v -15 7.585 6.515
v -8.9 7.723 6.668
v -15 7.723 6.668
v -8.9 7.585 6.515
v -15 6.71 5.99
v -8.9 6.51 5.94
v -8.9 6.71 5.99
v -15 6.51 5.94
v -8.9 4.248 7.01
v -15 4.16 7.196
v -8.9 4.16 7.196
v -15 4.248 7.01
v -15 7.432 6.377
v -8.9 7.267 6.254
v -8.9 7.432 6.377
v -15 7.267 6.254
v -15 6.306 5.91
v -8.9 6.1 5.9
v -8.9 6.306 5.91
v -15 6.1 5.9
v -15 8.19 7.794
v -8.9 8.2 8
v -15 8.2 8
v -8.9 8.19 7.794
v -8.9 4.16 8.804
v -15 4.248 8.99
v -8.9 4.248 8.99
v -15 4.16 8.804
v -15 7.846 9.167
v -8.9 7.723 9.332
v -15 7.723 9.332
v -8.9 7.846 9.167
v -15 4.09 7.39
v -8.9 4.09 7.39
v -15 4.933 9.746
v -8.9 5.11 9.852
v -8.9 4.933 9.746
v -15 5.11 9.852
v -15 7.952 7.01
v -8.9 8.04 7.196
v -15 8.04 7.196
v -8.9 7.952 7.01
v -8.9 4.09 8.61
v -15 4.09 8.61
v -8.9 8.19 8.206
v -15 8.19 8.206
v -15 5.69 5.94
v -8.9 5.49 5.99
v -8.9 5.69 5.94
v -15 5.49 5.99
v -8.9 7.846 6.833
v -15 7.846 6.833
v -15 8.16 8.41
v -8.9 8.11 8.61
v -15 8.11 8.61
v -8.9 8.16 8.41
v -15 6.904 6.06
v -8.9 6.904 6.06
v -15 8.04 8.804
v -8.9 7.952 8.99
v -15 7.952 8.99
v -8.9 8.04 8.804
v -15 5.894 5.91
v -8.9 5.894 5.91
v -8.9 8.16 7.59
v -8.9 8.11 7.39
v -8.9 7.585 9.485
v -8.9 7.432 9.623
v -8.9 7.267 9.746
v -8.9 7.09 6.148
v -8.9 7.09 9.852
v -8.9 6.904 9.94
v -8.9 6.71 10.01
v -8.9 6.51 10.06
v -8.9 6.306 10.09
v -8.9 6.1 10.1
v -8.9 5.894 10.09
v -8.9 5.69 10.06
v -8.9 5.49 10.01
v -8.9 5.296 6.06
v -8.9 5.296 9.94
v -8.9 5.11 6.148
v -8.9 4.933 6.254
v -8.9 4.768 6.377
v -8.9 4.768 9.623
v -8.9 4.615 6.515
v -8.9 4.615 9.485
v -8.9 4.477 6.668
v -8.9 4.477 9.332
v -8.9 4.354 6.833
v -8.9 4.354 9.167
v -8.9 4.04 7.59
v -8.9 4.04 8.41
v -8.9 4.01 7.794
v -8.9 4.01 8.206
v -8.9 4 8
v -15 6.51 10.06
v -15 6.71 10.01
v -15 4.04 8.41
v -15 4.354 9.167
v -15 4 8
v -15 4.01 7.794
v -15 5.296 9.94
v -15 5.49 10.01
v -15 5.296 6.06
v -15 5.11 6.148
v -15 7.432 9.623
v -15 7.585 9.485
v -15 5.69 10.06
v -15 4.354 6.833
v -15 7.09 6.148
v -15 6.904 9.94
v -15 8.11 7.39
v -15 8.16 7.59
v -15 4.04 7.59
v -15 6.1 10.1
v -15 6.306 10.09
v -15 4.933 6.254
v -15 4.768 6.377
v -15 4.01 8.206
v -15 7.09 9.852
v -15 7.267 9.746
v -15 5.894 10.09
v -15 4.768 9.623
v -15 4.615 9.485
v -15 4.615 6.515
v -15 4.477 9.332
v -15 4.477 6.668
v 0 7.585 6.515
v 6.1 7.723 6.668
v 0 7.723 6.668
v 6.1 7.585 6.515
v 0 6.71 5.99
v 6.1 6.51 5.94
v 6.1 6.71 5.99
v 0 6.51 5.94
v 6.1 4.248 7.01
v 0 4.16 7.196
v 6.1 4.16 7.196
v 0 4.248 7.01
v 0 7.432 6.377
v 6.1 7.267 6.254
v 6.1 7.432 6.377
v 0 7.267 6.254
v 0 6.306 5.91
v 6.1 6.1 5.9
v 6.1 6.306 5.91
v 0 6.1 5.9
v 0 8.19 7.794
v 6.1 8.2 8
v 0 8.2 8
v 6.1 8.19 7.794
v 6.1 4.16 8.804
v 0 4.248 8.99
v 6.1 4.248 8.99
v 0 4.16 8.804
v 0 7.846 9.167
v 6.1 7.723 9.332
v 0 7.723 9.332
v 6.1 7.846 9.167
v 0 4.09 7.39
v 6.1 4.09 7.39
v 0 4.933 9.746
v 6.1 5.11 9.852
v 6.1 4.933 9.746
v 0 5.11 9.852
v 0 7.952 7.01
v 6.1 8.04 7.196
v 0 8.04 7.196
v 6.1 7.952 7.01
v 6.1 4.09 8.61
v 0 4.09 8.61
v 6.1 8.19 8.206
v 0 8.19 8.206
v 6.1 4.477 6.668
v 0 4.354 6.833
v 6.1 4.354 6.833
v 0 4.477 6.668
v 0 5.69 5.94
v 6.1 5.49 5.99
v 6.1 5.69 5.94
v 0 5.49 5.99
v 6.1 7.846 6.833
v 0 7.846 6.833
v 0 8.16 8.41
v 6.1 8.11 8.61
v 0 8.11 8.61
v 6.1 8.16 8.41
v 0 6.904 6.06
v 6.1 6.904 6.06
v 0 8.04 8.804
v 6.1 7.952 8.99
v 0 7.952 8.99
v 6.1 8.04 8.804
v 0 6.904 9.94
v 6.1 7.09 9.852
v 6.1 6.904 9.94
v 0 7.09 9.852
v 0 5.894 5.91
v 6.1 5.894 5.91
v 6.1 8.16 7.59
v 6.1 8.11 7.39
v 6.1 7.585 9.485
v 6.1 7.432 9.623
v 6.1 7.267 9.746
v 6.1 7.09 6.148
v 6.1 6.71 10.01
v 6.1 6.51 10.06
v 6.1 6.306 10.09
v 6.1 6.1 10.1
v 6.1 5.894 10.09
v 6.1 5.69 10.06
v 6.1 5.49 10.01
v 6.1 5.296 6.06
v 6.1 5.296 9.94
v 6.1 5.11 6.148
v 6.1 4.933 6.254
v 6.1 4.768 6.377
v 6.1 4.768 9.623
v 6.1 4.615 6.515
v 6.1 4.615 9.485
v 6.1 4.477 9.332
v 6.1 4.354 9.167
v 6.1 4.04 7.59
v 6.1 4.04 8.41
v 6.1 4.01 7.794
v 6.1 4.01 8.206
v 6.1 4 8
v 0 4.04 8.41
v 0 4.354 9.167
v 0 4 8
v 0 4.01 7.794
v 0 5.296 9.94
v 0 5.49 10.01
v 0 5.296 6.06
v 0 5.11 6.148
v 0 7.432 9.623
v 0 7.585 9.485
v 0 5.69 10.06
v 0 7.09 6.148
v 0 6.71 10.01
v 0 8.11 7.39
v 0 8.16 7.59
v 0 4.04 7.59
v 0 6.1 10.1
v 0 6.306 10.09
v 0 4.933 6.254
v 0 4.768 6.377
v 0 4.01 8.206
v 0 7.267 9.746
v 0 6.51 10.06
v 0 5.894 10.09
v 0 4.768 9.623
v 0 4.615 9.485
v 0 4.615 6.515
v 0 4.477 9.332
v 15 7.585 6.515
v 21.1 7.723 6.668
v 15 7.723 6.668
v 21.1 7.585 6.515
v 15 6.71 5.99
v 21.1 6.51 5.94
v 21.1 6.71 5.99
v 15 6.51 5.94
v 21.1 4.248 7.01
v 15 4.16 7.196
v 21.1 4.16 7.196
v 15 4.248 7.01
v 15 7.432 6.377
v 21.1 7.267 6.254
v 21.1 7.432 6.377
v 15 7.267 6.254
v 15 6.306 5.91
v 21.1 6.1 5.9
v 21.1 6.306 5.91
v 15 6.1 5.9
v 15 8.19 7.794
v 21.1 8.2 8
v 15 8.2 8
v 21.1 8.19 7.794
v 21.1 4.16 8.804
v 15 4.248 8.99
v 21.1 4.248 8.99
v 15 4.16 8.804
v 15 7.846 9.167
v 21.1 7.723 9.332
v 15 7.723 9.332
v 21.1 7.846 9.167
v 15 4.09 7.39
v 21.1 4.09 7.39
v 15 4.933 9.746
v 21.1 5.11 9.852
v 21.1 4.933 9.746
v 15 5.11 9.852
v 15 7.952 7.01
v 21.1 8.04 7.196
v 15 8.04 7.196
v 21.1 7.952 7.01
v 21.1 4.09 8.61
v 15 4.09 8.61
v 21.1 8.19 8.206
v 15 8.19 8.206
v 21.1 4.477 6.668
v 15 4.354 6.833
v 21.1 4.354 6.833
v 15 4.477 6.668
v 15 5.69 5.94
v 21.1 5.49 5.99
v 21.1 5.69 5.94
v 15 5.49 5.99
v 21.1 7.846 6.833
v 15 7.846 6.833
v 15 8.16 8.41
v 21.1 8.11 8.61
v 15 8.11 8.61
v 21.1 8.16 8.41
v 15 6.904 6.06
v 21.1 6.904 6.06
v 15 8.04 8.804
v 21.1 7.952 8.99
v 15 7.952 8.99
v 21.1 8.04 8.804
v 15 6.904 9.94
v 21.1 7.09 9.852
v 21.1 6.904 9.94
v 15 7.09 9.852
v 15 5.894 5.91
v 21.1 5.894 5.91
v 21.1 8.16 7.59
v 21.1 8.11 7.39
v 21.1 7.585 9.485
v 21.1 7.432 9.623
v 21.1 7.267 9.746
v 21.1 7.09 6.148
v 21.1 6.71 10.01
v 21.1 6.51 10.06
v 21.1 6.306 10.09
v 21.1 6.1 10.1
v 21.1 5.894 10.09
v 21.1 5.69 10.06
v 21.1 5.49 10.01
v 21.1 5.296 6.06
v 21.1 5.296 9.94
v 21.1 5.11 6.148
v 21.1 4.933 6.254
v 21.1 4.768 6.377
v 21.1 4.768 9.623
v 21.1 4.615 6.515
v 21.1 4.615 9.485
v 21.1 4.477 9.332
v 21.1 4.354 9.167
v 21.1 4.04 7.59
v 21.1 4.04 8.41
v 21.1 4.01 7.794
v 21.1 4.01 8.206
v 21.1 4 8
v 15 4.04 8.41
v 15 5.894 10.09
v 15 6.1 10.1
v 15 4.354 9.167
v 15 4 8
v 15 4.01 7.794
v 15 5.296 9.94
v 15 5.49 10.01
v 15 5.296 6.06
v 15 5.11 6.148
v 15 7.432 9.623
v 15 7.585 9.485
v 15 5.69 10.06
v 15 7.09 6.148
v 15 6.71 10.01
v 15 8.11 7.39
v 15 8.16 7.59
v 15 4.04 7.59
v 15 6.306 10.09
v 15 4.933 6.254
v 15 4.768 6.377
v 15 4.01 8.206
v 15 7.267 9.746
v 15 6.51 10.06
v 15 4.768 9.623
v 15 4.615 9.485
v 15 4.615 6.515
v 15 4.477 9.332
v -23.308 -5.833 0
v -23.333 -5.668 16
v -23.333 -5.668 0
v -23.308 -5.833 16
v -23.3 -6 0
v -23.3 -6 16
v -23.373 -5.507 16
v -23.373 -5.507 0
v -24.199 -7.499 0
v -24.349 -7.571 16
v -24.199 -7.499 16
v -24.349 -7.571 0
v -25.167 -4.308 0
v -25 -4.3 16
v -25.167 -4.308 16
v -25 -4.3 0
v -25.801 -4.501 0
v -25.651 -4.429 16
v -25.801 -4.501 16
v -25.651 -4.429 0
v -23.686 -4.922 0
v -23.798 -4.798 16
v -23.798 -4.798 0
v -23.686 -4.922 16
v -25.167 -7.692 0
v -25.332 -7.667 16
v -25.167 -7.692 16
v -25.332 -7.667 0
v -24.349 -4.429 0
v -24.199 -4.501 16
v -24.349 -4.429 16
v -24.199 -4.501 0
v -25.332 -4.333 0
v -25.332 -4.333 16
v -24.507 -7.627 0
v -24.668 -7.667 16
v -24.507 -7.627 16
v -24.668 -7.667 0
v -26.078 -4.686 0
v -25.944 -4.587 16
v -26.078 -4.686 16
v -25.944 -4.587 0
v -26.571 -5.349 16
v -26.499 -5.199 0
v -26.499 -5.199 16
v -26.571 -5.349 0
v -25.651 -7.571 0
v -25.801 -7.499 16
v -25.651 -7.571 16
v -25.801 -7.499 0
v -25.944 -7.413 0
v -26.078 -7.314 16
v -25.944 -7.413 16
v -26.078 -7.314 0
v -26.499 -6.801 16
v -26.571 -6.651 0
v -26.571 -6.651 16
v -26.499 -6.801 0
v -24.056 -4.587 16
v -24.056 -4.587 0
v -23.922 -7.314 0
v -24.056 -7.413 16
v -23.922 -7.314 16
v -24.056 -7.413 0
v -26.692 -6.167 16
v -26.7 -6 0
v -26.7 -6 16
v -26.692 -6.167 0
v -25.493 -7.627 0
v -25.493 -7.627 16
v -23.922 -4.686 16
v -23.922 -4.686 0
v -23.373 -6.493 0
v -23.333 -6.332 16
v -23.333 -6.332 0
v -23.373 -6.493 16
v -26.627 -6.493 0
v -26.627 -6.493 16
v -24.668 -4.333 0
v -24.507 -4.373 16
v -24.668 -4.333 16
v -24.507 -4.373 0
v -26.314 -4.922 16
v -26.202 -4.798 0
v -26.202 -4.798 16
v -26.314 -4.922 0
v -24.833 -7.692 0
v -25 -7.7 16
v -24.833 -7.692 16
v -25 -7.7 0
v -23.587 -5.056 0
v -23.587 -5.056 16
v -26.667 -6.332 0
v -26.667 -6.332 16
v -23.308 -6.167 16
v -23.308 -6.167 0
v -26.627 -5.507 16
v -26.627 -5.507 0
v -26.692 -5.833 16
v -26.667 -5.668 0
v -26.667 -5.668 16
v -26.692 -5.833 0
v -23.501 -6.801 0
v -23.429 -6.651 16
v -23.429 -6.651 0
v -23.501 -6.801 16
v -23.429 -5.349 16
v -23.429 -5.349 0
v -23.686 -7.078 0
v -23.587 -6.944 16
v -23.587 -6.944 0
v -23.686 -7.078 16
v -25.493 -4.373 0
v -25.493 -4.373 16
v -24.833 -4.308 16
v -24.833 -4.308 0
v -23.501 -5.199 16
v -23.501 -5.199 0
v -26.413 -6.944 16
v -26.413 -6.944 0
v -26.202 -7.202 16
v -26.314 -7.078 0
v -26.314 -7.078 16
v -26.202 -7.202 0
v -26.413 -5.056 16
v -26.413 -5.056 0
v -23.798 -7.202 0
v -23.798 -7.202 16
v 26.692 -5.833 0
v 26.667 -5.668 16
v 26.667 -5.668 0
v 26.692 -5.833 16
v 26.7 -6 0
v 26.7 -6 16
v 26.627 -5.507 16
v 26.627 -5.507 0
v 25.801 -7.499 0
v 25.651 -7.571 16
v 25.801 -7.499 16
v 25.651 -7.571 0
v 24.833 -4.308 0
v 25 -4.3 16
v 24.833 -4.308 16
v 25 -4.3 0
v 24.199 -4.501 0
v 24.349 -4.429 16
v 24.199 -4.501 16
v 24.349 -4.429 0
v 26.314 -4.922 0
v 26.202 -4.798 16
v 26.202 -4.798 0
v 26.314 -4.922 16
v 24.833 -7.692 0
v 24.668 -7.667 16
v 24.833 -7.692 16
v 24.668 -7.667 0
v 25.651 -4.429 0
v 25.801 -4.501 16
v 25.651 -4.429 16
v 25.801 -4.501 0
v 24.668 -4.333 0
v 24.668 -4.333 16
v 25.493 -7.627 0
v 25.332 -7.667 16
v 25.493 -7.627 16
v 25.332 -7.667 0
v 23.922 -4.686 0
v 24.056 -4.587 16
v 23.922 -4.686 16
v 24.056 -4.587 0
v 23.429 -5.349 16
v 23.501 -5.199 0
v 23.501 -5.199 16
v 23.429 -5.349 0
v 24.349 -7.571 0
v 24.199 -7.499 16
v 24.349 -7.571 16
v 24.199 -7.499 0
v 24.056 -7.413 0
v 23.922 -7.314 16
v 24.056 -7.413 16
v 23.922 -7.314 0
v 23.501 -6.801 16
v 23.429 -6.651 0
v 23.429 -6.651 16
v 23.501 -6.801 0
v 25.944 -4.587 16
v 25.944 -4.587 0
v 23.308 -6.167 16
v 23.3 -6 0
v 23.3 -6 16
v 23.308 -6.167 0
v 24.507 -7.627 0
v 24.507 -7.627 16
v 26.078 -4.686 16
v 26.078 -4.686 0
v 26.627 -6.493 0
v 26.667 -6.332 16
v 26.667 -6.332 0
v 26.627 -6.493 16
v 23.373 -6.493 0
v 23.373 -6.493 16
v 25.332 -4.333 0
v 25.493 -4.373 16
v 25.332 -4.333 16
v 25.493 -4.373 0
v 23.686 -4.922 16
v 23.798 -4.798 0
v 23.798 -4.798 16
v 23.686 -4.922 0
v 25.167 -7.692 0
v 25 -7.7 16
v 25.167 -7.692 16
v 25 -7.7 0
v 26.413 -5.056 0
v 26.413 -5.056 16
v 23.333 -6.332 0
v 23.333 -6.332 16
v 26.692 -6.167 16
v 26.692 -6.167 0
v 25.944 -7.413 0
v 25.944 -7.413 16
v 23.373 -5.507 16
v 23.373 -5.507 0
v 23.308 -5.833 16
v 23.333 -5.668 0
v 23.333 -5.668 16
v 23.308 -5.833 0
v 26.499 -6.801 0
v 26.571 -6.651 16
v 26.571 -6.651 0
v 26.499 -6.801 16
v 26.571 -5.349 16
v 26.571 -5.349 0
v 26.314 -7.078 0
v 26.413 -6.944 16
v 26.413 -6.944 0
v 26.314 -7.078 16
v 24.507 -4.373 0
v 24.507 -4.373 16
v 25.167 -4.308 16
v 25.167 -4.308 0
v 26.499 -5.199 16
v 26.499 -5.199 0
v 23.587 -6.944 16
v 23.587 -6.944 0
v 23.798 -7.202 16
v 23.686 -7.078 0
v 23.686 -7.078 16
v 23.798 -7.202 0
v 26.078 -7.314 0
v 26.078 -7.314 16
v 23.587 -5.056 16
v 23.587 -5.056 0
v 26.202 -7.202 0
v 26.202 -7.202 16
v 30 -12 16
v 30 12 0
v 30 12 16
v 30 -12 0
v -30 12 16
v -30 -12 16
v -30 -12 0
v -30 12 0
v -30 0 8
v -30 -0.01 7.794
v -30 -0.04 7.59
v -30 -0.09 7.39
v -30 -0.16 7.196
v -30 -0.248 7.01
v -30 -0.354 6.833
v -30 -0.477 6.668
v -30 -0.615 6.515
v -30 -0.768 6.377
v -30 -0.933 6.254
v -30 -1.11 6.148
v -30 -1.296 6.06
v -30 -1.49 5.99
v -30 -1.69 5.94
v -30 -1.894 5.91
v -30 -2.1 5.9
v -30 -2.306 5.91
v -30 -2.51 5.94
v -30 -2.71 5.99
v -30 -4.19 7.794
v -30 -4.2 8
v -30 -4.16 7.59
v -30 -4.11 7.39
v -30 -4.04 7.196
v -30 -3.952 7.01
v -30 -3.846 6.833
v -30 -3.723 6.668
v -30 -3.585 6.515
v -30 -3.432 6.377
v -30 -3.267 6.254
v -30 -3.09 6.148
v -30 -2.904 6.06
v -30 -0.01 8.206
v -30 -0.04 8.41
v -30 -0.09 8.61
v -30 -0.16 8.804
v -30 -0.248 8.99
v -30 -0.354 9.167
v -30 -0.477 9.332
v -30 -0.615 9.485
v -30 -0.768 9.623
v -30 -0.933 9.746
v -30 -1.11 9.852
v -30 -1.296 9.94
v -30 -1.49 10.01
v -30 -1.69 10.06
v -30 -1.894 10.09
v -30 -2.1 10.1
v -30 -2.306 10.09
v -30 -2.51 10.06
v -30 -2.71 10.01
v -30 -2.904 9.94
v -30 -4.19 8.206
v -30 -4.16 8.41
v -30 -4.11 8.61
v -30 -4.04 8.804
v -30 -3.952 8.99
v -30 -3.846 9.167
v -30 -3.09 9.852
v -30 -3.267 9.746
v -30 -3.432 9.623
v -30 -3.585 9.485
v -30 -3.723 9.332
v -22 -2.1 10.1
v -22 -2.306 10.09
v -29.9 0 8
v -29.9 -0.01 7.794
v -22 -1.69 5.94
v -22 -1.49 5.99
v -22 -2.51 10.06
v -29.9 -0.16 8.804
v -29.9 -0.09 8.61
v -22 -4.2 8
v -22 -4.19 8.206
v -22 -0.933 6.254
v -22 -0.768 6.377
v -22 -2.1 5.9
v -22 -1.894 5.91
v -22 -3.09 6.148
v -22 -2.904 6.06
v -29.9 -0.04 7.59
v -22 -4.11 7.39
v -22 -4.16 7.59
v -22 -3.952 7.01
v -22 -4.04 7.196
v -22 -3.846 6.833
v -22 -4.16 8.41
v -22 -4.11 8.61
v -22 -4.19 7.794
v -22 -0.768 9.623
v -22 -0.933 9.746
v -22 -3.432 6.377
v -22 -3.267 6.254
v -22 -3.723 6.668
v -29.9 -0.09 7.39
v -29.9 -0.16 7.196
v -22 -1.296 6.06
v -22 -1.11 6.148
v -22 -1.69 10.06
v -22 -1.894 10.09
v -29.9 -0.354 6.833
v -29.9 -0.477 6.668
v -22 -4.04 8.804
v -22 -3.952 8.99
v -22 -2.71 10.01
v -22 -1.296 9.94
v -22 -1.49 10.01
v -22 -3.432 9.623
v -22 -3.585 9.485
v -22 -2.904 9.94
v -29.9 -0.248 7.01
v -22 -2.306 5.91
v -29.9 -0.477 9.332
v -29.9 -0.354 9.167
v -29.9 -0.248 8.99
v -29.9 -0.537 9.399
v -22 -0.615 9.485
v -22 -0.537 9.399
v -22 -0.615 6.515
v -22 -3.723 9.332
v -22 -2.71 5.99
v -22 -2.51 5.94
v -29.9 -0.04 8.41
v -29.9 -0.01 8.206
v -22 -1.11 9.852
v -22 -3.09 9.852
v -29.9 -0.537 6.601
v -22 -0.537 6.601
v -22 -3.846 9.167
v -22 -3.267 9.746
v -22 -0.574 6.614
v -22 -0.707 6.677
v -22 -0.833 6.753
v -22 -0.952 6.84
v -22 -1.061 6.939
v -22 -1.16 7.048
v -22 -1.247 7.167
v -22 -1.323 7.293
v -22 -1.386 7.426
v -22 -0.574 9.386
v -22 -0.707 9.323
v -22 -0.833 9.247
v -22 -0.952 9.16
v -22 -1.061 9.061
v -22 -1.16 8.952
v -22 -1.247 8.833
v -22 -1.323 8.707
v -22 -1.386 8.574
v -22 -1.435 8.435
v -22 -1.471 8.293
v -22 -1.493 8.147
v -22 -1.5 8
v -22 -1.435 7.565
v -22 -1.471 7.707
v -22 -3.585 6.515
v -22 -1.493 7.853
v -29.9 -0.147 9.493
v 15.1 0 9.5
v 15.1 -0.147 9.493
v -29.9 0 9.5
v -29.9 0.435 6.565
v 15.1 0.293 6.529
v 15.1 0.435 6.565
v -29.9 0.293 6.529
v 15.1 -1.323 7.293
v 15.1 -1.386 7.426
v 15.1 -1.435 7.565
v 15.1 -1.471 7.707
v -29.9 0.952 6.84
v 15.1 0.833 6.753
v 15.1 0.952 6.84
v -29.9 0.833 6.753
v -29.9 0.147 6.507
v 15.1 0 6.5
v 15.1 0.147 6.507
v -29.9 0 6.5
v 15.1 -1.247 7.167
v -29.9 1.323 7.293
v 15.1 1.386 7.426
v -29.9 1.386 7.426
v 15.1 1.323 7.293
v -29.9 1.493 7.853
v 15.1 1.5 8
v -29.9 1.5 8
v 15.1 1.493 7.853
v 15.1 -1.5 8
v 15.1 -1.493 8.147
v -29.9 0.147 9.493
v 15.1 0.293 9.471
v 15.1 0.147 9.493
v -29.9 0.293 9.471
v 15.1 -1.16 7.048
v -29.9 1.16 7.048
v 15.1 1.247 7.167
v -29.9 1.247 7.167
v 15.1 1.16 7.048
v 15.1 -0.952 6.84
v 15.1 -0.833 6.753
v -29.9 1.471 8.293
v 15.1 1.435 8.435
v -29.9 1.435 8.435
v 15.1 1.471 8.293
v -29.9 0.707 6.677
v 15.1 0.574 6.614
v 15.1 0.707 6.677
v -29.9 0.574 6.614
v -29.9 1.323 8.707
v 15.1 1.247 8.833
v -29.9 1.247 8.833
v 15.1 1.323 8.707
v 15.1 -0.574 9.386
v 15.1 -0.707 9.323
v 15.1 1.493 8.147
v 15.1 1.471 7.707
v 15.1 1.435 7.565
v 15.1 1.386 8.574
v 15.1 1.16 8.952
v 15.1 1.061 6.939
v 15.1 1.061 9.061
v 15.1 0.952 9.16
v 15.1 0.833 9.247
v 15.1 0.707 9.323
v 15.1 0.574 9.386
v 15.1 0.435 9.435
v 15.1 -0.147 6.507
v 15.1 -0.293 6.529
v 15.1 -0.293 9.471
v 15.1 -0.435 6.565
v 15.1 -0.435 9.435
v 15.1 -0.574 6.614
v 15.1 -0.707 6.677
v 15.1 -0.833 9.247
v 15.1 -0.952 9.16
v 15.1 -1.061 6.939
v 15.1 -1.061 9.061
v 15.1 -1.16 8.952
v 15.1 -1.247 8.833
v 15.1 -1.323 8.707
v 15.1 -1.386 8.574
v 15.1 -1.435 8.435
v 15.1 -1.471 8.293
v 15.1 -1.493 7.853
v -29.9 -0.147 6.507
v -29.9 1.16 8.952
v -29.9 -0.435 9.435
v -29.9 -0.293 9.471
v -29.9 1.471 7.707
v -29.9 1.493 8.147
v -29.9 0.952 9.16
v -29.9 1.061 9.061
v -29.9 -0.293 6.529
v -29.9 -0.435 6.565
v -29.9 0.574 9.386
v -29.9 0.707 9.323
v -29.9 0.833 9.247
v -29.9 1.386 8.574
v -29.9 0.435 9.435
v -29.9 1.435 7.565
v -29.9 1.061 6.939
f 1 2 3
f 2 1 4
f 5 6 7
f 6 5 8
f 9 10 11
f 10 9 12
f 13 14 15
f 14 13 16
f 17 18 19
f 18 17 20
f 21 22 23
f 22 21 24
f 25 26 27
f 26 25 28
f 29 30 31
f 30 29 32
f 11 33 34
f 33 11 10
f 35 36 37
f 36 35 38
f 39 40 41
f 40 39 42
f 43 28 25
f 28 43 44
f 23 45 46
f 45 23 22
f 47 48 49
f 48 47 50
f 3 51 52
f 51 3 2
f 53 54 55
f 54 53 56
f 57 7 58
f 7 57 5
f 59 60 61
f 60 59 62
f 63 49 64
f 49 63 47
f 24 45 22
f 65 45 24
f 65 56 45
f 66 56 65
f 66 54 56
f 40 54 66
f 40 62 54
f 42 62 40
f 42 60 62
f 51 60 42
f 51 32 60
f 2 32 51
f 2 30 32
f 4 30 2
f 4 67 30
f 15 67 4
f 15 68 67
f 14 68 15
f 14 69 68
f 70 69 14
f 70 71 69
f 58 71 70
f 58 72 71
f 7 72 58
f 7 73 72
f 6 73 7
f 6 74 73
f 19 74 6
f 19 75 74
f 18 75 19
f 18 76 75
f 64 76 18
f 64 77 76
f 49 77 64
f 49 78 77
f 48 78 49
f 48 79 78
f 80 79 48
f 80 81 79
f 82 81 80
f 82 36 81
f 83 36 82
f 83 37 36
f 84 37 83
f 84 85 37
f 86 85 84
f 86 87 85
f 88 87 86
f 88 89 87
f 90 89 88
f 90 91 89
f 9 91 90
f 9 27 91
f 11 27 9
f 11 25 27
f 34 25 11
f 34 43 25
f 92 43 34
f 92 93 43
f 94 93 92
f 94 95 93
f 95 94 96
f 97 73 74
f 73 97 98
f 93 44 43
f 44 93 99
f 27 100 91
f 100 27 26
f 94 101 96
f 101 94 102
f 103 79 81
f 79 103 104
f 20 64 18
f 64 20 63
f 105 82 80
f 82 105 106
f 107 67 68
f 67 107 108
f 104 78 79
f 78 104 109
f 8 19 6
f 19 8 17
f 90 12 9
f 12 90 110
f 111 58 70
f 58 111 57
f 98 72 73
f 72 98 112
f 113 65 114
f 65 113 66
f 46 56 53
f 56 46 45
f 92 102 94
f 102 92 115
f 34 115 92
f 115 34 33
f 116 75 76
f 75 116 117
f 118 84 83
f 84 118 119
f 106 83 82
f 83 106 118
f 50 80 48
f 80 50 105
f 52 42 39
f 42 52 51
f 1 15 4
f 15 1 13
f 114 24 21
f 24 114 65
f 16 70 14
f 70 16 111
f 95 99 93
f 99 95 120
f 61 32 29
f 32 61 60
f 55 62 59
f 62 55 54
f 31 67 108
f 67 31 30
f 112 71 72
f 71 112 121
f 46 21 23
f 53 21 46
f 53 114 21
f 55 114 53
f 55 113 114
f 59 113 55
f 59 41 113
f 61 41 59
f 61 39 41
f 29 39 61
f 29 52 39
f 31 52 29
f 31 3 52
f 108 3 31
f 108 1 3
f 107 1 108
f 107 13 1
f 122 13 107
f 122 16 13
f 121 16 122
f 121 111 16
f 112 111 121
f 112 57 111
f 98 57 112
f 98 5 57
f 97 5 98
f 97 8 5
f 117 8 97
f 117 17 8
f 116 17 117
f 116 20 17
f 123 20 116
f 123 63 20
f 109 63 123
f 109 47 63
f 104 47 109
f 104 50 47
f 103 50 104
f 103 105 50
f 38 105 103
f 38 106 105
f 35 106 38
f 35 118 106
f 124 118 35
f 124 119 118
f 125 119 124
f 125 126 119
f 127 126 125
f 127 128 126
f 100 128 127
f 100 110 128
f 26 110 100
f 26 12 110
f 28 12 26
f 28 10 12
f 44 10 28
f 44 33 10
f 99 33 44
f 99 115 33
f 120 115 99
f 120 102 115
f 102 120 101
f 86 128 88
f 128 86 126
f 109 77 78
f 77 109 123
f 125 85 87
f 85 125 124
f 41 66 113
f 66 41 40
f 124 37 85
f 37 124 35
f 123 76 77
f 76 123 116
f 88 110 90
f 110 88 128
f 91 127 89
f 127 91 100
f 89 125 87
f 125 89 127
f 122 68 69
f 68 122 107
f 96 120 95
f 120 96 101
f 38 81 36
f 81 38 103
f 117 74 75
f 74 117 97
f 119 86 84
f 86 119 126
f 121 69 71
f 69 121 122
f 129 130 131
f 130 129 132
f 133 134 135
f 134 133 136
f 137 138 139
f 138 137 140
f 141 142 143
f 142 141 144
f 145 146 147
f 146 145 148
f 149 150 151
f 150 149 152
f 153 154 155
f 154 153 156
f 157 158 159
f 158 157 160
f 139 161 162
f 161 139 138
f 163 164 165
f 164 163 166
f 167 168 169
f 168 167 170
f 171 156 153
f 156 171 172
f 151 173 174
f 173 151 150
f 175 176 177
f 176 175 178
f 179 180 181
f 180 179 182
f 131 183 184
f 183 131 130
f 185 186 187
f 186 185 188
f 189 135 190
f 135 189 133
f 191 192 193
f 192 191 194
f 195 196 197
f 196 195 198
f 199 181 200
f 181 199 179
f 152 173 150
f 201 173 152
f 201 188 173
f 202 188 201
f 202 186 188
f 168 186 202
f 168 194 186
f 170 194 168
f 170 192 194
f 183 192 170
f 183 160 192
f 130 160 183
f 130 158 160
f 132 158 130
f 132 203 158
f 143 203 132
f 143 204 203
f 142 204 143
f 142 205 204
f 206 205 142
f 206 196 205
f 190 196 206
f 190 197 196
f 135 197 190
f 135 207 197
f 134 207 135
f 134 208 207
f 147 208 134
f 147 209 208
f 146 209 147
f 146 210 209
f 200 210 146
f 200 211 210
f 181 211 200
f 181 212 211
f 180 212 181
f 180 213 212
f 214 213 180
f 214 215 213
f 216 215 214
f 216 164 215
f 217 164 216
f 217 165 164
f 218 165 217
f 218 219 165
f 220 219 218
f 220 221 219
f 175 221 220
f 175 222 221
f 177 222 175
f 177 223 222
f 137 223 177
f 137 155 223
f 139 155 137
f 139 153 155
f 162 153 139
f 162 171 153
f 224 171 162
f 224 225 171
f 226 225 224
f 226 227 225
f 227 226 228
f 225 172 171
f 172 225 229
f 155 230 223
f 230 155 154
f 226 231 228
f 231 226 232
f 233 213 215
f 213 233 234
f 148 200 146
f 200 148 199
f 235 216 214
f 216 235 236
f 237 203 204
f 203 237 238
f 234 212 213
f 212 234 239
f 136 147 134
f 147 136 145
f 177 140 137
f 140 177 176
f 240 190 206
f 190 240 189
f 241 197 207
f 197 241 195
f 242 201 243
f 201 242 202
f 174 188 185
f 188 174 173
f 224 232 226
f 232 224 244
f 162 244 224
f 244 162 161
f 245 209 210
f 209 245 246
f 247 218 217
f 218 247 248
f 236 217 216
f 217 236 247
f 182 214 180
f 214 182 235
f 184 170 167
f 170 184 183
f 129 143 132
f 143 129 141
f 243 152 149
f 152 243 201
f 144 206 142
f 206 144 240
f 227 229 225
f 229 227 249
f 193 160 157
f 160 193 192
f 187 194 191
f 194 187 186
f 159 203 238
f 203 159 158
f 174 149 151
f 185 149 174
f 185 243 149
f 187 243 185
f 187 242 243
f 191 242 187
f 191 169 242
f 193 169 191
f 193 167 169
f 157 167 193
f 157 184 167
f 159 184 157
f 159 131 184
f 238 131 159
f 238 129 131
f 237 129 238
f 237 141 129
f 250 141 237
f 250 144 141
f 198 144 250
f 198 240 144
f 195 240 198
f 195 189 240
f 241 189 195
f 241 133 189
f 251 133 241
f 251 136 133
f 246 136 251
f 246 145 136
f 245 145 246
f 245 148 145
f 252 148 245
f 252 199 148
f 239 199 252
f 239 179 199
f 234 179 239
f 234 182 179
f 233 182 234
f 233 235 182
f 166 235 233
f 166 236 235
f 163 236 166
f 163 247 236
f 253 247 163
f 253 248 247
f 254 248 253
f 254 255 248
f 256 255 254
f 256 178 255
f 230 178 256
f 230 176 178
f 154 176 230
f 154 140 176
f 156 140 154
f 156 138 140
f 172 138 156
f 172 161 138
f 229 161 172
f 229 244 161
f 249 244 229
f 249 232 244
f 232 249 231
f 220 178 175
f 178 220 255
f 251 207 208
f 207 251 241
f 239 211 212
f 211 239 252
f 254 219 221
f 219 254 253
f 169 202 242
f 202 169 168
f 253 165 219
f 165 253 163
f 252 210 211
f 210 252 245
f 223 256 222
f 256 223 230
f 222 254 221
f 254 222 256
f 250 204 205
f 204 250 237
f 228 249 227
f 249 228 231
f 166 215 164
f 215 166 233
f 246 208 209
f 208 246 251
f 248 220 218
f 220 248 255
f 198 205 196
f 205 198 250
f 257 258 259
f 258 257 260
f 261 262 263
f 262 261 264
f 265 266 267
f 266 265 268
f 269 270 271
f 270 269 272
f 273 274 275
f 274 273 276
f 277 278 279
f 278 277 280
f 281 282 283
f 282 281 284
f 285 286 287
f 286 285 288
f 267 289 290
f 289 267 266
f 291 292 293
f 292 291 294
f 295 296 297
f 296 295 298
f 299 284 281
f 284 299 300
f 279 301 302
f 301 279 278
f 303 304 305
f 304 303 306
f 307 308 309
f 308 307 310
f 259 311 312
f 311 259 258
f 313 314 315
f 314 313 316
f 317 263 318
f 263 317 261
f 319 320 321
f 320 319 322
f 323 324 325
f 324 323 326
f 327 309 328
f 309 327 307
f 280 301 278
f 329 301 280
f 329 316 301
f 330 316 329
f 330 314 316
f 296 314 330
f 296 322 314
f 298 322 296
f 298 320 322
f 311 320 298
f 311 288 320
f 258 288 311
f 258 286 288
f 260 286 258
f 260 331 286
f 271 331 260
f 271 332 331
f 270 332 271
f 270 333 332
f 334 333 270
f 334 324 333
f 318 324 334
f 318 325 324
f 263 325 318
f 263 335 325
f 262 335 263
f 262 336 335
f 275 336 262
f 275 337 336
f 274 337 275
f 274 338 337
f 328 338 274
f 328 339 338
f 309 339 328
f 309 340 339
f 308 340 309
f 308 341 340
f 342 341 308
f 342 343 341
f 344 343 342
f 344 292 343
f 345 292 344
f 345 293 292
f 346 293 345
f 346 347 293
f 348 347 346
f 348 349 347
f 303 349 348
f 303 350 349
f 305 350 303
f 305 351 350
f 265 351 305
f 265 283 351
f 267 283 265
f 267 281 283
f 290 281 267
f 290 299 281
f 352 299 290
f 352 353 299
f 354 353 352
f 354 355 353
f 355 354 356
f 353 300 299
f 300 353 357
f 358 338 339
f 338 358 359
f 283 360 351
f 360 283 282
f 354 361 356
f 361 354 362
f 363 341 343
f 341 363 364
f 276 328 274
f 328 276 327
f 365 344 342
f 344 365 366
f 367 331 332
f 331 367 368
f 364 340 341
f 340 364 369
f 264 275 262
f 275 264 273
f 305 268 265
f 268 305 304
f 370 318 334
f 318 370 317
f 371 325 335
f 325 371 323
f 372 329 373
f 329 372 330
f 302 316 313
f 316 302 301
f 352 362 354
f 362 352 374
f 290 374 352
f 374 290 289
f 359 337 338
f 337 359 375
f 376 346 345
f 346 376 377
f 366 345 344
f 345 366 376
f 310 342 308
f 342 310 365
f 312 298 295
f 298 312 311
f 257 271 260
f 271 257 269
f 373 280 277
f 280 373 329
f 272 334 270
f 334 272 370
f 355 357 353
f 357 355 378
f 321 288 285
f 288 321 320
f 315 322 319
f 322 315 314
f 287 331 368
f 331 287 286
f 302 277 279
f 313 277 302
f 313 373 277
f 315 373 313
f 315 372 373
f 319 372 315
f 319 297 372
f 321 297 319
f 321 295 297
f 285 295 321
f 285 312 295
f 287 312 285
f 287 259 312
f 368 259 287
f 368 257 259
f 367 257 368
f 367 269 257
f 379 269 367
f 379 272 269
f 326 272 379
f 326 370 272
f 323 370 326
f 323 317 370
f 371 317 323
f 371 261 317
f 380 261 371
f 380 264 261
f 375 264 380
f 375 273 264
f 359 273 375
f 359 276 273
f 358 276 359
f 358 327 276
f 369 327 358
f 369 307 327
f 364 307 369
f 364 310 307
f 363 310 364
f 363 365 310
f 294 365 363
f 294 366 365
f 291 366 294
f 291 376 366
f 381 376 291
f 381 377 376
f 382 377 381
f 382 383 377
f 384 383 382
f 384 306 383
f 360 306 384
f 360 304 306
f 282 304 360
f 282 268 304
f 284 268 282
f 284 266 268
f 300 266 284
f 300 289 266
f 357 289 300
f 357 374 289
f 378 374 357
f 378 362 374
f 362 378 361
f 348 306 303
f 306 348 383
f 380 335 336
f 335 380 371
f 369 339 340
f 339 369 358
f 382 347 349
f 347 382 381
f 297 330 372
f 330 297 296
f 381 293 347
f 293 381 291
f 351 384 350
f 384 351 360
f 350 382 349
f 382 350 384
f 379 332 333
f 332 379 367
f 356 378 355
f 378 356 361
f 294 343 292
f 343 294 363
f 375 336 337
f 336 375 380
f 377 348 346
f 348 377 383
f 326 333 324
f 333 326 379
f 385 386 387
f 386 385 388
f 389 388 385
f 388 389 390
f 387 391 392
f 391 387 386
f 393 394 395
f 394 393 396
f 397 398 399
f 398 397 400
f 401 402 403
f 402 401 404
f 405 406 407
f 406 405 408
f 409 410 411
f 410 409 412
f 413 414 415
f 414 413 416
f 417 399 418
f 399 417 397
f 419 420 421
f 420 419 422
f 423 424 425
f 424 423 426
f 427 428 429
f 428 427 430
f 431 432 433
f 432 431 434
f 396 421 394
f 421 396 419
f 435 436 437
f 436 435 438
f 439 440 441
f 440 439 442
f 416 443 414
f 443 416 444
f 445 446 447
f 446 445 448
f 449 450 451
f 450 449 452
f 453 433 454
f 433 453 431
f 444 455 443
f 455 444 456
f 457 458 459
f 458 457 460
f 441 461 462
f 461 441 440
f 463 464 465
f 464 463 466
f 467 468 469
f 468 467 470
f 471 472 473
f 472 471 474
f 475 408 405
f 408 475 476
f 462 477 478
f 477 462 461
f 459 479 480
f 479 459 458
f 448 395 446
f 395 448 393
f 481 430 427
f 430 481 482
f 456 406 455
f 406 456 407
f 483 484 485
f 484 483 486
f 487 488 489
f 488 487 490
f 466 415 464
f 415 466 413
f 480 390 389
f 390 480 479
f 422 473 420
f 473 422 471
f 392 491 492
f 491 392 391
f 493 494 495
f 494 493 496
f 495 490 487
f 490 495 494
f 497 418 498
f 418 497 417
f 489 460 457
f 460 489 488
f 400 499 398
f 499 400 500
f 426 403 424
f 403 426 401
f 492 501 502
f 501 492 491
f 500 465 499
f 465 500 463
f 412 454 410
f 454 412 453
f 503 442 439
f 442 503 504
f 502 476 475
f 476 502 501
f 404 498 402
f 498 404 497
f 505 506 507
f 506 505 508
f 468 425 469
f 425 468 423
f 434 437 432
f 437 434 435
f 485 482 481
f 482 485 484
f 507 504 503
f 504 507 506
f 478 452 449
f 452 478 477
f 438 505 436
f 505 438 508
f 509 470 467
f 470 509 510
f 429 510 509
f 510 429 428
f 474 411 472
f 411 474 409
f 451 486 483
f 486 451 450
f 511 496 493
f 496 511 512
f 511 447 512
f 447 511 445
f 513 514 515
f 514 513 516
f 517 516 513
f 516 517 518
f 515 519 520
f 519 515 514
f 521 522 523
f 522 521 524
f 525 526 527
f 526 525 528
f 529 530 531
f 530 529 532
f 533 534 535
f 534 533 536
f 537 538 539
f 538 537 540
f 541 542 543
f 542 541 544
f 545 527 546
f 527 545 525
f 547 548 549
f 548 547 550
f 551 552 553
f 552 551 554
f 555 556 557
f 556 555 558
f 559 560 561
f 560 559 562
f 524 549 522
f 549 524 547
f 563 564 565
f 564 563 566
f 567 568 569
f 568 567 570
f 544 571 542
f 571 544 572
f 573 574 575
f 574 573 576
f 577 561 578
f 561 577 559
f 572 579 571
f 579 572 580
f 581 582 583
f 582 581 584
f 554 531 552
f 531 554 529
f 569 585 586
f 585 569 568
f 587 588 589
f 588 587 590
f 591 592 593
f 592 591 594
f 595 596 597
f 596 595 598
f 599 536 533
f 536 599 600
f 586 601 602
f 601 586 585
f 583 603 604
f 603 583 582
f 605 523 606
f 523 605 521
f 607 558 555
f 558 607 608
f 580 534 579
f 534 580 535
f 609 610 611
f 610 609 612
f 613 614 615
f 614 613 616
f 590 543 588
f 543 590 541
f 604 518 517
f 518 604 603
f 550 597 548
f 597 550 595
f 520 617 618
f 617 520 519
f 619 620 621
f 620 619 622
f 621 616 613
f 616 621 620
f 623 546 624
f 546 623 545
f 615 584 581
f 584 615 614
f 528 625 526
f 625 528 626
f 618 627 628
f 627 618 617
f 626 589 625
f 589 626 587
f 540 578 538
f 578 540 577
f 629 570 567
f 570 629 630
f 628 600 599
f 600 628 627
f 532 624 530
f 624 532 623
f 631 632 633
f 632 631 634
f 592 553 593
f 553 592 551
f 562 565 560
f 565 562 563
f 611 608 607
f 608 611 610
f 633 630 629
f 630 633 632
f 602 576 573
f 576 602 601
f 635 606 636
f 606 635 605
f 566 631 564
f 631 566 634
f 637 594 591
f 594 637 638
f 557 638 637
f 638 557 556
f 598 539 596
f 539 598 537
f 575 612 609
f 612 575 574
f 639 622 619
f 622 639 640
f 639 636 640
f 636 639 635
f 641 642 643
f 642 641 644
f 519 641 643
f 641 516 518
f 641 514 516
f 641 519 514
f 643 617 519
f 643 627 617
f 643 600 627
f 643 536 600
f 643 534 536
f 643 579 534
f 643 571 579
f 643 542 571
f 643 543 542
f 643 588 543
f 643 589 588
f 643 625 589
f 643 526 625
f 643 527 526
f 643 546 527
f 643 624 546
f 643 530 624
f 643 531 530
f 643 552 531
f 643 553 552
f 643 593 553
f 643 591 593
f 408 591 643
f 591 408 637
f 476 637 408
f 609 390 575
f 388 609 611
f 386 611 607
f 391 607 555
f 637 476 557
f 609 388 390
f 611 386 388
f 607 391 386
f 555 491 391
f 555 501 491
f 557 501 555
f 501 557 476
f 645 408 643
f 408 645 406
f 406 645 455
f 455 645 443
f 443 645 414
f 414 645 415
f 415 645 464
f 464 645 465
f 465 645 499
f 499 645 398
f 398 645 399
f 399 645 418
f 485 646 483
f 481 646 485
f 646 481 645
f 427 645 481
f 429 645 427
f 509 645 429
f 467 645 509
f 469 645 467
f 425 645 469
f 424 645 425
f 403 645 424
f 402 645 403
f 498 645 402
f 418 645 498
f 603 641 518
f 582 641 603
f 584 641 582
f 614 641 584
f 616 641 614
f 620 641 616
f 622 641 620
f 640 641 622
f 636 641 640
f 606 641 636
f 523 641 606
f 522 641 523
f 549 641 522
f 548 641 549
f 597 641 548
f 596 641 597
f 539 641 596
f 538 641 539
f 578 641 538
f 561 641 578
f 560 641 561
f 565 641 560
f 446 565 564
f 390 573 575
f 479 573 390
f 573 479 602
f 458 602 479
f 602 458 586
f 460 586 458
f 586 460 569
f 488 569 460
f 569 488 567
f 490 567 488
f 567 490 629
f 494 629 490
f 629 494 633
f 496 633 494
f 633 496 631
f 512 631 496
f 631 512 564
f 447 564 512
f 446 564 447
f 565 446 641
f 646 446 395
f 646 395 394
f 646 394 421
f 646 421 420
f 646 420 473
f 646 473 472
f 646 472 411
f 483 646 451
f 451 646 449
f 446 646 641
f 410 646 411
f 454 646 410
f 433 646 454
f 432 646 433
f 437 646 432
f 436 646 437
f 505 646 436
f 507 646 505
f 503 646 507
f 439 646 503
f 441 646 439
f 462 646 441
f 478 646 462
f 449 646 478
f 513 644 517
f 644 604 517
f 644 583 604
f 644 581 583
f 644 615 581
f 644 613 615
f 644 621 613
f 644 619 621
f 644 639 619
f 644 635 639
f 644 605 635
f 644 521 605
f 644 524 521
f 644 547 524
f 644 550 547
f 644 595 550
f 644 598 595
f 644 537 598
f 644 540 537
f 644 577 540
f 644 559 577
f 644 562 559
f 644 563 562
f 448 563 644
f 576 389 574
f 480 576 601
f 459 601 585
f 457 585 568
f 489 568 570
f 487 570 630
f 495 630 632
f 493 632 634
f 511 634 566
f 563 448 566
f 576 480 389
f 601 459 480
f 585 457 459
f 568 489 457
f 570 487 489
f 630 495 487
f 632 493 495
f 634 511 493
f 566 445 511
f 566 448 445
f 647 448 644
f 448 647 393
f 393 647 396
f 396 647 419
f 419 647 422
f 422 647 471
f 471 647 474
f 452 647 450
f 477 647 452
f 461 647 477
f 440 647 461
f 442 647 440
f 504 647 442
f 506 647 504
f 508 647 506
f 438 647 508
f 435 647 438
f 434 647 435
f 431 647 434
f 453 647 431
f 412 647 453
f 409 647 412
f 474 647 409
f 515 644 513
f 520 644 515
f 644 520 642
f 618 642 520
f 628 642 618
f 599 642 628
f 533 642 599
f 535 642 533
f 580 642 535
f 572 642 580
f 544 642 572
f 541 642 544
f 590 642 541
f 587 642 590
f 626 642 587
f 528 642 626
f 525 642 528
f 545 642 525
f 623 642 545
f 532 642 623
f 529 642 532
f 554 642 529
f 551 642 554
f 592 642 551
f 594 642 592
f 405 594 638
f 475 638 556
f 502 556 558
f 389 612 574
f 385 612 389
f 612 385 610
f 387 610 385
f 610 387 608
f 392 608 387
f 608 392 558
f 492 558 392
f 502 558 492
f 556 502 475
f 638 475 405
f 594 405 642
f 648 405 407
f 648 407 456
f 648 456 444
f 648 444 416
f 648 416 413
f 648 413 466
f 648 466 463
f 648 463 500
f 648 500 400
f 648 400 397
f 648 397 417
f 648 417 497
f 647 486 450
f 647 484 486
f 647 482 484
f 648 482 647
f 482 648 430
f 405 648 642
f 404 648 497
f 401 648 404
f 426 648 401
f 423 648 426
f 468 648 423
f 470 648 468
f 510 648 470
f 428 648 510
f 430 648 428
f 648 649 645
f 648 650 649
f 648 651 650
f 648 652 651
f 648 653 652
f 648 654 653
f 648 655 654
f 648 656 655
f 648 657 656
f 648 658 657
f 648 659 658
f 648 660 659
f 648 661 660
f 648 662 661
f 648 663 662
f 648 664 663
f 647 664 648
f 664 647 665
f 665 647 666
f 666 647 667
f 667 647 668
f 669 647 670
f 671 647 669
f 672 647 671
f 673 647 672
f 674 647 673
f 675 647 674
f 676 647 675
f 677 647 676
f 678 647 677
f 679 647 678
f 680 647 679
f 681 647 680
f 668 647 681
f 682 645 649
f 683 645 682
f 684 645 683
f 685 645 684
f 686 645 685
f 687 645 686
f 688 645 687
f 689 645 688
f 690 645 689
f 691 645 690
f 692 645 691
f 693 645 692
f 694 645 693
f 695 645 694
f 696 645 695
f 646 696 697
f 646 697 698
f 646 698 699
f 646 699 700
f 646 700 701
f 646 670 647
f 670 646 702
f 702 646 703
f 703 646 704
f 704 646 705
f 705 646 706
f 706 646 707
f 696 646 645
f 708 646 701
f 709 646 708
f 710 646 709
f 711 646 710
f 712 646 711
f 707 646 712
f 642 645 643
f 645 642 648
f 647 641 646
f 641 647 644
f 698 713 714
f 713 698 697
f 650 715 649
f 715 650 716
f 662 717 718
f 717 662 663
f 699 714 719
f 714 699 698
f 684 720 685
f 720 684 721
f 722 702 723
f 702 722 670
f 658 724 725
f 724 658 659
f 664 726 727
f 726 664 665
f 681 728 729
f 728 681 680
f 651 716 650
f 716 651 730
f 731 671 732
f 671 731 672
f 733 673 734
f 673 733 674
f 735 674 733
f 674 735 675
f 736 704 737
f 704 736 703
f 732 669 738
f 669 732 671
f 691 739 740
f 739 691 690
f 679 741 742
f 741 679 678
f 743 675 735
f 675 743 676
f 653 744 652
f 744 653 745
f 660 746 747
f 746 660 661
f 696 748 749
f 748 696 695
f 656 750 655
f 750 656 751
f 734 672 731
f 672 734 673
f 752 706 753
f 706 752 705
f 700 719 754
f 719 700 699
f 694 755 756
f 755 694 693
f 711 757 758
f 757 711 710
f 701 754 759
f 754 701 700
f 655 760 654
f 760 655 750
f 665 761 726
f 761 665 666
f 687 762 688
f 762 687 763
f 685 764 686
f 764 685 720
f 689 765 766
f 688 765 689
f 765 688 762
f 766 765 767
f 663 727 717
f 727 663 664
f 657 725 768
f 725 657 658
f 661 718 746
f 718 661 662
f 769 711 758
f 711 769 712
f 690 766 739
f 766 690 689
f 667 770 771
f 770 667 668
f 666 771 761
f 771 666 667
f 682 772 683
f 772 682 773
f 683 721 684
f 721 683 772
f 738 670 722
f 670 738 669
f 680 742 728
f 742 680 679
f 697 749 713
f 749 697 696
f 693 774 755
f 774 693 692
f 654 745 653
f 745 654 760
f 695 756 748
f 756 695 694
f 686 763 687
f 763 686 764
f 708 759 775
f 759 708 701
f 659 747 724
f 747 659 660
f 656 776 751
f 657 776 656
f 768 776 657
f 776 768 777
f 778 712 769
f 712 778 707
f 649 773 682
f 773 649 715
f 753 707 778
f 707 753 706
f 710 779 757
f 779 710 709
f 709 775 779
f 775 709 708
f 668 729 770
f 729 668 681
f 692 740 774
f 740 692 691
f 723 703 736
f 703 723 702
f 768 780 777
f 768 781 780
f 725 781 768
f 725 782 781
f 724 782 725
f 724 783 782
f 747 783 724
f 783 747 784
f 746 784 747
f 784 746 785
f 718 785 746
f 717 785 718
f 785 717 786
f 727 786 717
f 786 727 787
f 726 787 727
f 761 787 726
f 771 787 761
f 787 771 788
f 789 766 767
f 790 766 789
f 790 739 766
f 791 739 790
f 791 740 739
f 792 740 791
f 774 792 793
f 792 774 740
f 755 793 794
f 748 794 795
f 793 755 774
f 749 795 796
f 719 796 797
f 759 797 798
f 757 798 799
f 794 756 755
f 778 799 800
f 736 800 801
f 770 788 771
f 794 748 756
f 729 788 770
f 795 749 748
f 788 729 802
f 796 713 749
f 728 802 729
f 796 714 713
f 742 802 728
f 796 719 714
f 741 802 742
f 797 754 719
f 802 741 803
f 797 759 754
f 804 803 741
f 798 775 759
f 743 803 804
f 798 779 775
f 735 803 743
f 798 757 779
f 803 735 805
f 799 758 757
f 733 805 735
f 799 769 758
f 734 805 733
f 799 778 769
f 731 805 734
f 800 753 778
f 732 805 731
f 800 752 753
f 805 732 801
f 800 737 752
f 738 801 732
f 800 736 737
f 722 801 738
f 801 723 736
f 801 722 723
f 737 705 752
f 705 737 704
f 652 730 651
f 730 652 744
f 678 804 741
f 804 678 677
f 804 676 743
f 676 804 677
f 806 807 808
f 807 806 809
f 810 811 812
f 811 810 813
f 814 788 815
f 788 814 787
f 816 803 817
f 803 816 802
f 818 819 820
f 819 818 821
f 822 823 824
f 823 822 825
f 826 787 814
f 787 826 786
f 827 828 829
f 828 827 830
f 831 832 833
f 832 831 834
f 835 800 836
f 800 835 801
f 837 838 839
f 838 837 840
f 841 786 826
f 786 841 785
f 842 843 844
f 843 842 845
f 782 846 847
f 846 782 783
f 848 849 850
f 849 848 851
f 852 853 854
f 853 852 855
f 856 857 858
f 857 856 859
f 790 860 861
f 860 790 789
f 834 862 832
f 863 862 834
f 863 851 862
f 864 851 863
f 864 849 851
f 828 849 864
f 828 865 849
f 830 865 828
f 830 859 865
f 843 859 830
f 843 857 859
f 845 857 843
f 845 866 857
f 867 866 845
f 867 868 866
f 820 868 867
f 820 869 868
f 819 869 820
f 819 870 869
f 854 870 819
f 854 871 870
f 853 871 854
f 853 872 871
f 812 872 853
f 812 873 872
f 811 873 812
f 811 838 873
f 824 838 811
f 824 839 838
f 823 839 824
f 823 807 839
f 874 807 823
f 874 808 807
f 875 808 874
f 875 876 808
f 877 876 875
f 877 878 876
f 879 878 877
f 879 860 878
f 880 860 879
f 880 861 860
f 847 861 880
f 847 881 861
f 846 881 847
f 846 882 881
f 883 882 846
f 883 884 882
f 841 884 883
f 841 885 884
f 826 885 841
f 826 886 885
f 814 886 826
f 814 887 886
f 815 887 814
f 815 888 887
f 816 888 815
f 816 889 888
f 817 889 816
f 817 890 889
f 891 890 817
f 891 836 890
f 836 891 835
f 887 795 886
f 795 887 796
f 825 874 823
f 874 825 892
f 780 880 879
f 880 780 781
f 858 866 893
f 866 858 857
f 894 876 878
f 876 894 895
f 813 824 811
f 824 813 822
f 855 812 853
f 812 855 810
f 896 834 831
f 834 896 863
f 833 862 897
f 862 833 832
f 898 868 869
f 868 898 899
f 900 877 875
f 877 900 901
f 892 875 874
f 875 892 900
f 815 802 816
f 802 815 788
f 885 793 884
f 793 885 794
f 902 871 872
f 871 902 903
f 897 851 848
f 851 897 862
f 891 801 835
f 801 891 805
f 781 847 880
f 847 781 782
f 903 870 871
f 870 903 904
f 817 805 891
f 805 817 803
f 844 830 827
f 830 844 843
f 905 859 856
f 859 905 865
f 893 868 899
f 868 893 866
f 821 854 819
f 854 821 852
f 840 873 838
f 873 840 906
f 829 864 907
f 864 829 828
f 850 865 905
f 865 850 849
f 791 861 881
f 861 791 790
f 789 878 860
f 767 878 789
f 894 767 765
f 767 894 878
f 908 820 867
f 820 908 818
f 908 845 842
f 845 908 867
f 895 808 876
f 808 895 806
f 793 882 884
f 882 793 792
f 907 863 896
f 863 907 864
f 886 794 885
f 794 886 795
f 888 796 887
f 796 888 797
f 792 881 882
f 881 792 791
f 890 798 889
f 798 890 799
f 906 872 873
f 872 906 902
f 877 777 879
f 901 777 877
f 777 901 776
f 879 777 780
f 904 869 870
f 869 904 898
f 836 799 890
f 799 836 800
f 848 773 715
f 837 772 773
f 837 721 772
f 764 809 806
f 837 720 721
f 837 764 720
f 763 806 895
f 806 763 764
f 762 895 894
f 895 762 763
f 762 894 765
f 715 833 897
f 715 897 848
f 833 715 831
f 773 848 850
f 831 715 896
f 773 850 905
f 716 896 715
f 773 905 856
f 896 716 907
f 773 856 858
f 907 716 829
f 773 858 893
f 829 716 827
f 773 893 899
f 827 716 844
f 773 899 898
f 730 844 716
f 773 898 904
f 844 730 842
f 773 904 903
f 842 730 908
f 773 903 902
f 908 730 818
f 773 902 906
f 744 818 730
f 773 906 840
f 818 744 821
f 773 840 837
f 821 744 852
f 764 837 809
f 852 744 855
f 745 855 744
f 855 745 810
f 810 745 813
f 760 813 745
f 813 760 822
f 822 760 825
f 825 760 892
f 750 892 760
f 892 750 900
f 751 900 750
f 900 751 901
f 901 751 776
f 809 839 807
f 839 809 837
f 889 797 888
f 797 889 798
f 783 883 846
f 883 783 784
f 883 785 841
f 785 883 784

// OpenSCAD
// --- Dimensions (mm) ---
block_x = 60;            // Total length of block
block_y = 24;            // Total width of block
block_z = 16;            // Total height of block

channel_dia = 3;         // Diameter of internal channels
inlet_socket_dia = 4.2;  // Diameter of inlet socket
inlet_socket_depth = 8;  // Depth of inlet socket
outlet_socket_dia = 4.2; // Diameter of outlet sockets
outlet_socket_depth = 6; // Depth of outlet sockets

// Main channel runs from inlet (-30) to x = 15.
// Total length = 30 (from -30 to 0) + 15 (from 0 to 15) = 45mm.
main_channel_length = 45; 

// Outlet positions relative to origin
outlet_x_positions = [-15, 0, 15]; 

screw_hole_dia = 3.4;    // Diameter for M3 screw holes
screw_hole_x = [-25, 25]; // X positions of screw holes
screw_hole_y = -6;       // Y position of screw holes

// --- Constants ---
$fn = 64;

// --- Main Block Construction ---
difference() {
    // The main solid block
    // Centered on X and Y, resting on Z=0
    translate([-block_x/2, -block_y/2, 0])
        cube([block_x, block_y, block_z]);

    // 1. Inlet Socket (-X face, at y=0, centered on Z)
    // Face is at x = -30. Socket goes 8mm deep into the block.
    // Centered on Y=0 and Z=8.
    translate([-block_x/2 - 0.1, -inlet_socket_dia/2, 8])
        rotate([0, 90, 0])
            cylinder(h = inlet_socket_depth + 0.1, d = inlet_socket_dia);

    // 2. Main Channel
    // Runs from the inlet (-30) to x = 15.
    // We use a cylinder centered at Z=8.
    translate([-block_x/2 + 0.1, 0, 8])
        rotate([0, 90, 0])
            cylinder(h = main_channel_length, d = channel_dia);

    // 3. Outlet Sockets (+Y face)
    // Three outlets at x = -15, 0, 15. 
    // They run in +Y direction to the +Y face (y = 12).
    // They end at the face, so they are cut from the face inward.
    for (ox = outlet_x_positions) {
        // The socket is centered on X=ox and Z=8.
        // It starts at the face (y=12) and goes 6mm deep (to y=6).
        translate([ox, block_y/2 - outlet_socket_depth + 0.1, 8])
            rotate([0, 90, 0])
                cylinder(h = outlet_socket_depth + 0.1, d = outlet_socket_dia);
    }

    // 4. Screw Holes (Vertical through-holes)
    // Through the block at x = -25 and 25, y = -6.
    // The previous report showed the center was at -7.7. 
    // To center a hole of diameter 3.4 at y = -6, we translate to y = -6.
    for (sx = screw_hole_x) {
        translate([sx, screw_hole_y, -0.1])
            cylinder(h = block_z + 0.2, d = screw_hole_dia);
    }
}
